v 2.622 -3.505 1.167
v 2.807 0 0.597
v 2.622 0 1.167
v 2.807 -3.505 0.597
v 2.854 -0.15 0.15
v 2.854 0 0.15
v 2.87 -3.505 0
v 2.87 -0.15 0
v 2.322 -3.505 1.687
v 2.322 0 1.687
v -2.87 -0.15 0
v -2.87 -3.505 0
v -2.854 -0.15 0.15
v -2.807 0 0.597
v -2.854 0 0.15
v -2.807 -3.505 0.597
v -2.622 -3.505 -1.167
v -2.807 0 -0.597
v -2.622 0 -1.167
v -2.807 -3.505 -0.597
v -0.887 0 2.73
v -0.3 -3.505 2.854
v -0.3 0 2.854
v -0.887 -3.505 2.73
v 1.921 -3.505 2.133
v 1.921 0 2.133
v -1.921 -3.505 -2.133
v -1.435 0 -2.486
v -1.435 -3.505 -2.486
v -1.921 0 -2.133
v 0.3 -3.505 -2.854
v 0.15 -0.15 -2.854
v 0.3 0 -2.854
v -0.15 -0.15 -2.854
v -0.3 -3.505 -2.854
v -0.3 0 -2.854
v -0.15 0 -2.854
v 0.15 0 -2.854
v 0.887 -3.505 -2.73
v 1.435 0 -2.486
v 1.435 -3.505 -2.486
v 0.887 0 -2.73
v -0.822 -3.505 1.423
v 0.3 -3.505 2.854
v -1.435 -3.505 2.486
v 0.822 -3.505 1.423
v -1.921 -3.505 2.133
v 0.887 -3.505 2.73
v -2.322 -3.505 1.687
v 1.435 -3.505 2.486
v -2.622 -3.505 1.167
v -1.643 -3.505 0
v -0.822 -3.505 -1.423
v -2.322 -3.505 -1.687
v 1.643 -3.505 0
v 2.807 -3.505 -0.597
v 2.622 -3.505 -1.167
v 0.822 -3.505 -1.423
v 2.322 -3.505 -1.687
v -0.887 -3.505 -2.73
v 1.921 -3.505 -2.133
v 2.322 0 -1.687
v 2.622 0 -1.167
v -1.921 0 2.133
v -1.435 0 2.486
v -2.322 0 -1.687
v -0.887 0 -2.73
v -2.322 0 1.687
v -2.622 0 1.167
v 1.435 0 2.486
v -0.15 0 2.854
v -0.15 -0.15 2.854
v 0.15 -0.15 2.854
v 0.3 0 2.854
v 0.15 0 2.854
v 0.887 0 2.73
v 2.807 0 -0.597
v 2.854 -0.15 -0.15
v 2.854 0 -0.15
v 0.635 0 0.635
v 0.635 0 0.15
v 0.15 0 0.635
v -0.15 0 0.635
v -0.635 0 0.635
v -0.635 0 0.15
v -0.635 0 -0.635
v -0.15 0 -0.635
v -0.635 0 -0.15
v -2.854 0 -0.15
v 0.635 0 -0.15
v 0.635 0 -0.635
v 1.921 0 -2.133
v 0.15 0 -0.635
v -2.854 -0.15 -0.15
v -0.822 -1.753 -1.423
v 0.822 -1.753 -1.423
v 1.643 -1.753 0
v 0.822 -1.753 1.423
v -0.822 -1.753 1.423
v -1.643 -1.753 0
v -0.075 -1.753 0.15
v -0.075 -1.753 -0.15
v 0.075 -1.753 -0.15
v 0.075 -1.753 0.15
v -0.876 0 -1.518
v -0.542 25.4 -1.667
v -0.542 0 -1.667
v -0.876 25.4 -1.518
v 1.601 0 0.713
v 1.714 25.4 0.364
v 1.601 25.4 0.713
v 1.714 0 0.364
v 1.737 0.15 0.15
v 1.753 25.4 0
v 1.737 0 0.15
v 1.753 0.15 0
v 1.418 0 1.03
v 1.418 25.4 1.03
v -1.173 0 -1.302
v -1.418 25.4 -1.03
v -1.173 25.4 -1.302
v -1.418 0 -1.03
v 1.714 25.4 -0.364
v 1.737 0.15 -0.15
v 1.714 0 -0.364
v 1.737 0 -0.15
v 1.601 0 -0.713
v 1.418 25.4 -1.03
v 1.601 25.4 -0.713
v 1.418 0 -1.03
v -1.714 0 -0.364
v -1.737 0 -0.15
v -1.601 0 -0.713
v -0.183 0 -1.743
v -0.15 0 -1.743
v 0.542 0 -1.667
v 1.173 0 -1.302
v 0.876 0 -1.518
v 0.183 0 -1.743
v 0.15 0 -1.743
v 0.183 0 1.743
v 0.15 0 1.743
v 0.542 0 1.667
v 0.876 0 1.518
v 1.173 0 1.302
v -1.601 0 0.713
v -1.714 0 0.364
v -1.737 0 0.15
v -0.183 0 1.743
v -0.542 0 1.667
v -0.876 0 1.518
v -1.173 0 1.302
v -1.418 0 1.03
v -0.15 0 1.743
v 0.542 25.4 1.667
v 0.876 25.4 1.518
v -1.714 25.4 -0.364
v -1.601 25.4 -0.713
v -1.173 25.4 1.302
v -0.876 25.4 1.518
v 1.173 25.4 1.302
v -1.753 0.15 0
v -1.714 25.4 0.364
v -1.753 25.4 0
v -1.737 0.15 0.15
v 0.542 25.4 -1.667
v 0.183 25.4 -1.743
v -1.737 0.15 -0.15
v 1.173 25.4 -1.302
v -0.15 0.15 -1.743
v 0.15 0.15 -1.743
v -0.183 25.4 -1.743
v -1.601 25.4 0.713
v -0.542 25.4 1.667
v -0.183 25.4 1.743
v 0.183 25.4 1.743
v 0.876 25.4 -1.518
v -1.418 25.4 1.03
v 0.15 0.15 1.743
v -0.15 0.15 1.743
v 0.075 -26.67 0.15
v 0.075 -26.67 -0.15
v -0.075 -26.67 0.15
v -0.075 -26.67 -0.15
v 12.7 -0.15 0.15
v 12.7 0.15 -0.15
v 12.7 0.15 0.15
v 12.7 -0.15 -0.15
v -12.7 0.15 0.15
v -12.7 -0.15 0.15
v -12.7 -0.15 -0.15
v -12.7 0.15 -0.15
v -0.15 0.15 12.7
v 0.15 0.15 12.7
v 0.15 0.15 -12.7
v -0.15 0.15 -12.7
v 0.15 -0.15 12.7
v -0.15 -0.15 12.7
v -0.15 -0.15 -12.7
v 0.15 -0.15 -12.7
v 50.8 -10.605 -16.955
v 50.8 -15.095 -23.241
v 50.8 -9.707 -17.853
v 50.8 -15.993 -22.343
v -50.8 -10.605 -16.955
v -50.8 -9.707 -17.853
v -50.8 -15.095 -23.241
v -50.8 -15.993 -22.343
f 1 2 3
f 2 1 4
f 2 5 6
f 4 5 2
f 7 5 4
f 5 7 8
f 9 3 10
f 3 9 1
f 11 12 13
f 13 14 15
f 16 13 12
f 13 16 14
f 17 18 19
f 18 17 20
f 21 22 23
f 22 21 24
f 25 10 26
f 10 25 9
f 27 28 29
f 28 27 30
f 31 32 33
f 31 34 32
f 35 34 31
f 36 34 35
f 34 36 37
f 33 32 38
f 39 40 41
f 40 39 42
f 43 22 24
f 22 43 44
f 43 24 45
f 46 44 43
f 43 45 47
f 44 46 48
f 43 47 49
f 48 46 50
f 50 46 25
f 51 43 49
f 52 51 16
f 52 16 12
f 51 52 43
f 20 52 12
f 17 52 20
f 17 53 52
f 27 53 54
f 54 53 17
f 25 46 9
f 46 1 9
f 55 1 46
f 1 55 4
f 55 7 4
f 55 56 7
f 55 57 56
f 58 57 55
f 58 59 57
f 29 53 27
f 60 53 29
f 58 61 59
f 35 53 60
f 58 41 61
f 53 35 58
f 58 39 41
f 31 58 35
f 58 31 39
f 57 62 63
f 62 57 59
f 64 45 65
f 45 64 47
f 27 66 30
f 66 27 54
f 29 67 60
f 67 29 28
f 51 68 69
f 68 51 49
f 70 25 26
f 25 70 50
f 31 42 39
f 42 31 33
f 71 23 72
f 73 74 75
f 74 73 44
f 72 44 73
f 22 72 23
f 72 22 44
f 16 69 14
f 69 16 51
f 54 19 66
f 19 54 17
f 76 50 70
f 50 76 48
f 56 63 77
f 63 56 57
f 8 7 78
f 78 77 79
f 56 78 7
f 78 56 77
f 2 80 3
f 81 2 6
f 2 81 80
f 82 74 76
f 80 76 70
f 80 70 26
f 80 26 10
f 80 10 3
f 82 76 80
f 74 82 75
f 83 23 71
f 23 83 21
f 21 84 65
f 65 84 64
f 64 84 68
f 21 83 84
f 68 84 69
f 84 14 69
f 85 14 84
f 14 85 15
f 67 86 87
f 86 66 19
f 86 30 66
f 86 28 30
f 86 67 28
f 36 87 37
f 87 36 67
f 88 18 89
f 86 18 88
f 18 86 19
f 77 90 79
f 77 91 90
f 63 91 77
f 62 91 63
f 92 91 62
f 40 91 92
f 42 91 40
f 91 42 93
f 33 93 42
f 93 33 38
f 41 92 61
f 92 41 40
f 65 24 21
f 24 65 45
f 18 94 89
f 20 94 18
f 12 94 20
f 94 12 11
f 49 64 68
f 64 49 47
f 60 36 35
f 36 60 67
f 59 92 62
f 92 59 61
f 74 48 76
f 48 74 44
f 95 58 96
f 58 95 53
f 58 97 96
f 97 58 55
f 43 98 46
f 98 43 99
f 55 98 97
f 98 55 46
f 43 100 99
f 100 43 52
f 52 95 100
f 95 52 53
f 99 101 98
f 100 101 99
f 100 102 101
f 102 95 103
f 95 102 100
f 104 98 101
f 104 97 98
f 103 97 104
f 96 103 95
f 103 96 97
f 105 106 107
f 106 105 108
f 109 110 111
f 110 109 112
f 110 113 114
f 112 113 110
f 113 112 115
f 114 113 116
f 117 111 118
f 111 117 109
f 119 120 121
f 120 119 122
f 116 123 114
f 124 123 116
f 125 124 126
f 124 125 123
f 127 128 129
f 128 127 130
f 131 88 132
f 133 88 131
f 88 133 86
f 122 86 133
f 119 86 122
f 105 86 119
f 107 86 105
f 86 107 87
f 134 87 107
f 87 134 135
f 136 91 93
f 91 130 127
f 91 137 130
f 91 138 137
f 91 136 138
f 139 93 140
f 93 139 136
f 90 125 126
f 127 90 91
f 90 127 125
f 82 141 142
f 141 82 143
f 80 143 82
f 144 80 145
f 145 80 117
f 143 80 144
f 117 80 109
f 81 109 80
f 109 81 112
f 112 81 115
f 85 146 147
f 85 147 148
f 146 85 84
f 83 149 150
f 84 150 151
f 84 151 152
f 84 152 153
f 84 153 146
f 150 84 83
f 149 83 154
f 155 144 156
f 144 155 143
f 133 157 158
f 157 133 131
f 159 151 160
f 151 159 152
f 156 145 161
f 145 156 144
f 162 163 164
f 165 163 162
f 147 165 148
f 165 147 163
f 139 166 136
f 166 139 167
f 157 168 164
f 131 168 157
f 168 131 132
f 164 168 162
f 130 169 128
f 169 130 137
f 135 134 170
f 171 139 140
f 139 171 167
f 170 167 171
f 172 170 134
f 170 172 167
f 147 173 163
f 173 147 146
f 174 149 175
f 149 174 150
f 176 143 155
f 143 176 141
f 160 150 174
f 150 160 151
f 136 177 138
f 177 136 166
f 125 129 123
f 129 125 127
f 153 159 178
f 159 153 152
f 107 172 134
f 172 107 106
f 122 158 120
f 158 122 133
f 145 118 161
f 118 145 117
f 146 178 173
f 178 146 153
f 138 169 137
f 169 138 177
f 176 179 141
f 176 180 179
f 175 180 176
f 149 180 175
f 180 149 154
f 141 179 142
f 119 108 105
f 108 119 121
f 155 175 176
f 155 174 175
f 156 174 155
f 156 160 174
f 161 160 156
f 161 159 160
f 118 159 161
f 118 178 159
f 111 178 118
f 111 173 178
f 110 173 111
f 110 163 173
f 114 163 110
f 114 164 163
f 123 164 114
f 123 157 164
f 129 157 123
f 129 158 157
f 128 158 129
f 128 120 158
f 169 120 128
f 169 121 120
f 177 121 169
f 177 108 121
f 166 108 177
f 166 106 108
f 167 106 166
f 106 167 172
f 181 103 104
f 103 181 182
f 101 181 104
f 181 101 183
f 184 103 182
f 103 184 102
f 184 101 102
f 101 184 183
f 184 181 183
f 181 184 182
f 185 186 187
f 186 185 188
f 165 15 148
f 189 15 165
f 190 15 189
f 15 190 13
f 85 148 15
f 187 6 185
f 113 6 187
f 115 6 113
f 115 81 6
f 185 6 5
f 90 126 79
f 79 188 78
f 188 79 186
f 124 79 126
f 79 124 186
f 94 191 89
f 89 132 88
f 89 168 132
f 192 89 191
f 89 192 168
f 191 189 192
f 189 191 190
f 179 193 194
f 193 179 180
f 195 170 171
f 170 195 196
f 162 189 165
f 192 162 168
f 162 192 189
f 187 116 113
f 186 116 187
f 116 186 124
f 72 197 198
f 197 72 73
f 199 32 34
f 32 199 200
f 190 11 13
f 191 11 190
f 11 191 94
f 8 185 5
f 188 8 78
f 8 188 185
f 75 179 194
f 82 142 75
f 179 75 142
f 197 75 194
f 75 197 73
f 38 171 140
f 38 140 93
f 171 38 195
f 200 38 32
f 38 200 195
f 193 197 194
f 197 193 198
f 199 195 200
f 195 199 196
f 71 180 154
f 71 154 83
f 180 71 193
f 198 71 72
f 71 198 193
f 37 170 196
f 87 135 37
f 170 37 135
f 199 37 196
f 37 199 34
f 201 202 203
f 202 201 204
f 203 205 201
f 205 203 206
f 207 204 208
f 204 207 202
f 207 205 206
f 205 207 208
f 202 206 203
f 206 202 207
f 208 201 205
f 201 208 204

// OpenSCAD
include <../mo/mo.scad>

moSocketHeadCapScrew6_32BodyDiameter = 0.1380 * in;
moSocketHeadCapScrew6_32HeadDiameter = 0.226 * in;
moSocketHeadCapScrew6_32HeadHeight = 0.138 * in;
moSocketHeadCapScrew6_32HeadSocketDiameter = 7/64 * in + 0.02 * in;
moSocketHeadCapScrew6_32HeadKeyEngagement = 0.064 * in;

positions = [
  [ [ 0, 0, 0 ], [ 0, 0, 1 ], 0 ]
];

module moSocketHeadCapScrew6_32( l = 1 * in, p = 0, info = false ) {
  moPresent( positions, p, info )
    color( Steel ) {
      moPitch(){
        translate( [0,0,-l/2] )
          cylinder( h = l, d = moSocketHeadCapScrew6_32BodyDiameter, center = true );

          translate( [0,0,moSocketHeadCapScrew6_32HeadHeight/2] )
          difference() {
            cylinder( h = moSocketHeadCapScrew6_32HeadHeight, d = moSocketHeadCapScrew6_32HeadDiameter, center = true );
            translate( [0,0, moSocketHeadCapScrew6_32HeadKeyEngagement/2 + Epsilon ])
              cylinder( h = moSocketHeadCapScrew6_32HeadKeyEngagement + 2 * Epsilon,
                        d = moSocketHeadCapScrew6_32HeadSocketDiameter, center = true, $fn=6 );
          }
       }
    }
}

function moSocketHeadCapScrew6_32Position( p = 0 ) = positions[ p ];

moMoveOriginTo( moSocketHeadCapScrew6_32Position( 0 ) )
  moSocketHeadCapScrew6_32( 1 * in, info = true, $name = true );
